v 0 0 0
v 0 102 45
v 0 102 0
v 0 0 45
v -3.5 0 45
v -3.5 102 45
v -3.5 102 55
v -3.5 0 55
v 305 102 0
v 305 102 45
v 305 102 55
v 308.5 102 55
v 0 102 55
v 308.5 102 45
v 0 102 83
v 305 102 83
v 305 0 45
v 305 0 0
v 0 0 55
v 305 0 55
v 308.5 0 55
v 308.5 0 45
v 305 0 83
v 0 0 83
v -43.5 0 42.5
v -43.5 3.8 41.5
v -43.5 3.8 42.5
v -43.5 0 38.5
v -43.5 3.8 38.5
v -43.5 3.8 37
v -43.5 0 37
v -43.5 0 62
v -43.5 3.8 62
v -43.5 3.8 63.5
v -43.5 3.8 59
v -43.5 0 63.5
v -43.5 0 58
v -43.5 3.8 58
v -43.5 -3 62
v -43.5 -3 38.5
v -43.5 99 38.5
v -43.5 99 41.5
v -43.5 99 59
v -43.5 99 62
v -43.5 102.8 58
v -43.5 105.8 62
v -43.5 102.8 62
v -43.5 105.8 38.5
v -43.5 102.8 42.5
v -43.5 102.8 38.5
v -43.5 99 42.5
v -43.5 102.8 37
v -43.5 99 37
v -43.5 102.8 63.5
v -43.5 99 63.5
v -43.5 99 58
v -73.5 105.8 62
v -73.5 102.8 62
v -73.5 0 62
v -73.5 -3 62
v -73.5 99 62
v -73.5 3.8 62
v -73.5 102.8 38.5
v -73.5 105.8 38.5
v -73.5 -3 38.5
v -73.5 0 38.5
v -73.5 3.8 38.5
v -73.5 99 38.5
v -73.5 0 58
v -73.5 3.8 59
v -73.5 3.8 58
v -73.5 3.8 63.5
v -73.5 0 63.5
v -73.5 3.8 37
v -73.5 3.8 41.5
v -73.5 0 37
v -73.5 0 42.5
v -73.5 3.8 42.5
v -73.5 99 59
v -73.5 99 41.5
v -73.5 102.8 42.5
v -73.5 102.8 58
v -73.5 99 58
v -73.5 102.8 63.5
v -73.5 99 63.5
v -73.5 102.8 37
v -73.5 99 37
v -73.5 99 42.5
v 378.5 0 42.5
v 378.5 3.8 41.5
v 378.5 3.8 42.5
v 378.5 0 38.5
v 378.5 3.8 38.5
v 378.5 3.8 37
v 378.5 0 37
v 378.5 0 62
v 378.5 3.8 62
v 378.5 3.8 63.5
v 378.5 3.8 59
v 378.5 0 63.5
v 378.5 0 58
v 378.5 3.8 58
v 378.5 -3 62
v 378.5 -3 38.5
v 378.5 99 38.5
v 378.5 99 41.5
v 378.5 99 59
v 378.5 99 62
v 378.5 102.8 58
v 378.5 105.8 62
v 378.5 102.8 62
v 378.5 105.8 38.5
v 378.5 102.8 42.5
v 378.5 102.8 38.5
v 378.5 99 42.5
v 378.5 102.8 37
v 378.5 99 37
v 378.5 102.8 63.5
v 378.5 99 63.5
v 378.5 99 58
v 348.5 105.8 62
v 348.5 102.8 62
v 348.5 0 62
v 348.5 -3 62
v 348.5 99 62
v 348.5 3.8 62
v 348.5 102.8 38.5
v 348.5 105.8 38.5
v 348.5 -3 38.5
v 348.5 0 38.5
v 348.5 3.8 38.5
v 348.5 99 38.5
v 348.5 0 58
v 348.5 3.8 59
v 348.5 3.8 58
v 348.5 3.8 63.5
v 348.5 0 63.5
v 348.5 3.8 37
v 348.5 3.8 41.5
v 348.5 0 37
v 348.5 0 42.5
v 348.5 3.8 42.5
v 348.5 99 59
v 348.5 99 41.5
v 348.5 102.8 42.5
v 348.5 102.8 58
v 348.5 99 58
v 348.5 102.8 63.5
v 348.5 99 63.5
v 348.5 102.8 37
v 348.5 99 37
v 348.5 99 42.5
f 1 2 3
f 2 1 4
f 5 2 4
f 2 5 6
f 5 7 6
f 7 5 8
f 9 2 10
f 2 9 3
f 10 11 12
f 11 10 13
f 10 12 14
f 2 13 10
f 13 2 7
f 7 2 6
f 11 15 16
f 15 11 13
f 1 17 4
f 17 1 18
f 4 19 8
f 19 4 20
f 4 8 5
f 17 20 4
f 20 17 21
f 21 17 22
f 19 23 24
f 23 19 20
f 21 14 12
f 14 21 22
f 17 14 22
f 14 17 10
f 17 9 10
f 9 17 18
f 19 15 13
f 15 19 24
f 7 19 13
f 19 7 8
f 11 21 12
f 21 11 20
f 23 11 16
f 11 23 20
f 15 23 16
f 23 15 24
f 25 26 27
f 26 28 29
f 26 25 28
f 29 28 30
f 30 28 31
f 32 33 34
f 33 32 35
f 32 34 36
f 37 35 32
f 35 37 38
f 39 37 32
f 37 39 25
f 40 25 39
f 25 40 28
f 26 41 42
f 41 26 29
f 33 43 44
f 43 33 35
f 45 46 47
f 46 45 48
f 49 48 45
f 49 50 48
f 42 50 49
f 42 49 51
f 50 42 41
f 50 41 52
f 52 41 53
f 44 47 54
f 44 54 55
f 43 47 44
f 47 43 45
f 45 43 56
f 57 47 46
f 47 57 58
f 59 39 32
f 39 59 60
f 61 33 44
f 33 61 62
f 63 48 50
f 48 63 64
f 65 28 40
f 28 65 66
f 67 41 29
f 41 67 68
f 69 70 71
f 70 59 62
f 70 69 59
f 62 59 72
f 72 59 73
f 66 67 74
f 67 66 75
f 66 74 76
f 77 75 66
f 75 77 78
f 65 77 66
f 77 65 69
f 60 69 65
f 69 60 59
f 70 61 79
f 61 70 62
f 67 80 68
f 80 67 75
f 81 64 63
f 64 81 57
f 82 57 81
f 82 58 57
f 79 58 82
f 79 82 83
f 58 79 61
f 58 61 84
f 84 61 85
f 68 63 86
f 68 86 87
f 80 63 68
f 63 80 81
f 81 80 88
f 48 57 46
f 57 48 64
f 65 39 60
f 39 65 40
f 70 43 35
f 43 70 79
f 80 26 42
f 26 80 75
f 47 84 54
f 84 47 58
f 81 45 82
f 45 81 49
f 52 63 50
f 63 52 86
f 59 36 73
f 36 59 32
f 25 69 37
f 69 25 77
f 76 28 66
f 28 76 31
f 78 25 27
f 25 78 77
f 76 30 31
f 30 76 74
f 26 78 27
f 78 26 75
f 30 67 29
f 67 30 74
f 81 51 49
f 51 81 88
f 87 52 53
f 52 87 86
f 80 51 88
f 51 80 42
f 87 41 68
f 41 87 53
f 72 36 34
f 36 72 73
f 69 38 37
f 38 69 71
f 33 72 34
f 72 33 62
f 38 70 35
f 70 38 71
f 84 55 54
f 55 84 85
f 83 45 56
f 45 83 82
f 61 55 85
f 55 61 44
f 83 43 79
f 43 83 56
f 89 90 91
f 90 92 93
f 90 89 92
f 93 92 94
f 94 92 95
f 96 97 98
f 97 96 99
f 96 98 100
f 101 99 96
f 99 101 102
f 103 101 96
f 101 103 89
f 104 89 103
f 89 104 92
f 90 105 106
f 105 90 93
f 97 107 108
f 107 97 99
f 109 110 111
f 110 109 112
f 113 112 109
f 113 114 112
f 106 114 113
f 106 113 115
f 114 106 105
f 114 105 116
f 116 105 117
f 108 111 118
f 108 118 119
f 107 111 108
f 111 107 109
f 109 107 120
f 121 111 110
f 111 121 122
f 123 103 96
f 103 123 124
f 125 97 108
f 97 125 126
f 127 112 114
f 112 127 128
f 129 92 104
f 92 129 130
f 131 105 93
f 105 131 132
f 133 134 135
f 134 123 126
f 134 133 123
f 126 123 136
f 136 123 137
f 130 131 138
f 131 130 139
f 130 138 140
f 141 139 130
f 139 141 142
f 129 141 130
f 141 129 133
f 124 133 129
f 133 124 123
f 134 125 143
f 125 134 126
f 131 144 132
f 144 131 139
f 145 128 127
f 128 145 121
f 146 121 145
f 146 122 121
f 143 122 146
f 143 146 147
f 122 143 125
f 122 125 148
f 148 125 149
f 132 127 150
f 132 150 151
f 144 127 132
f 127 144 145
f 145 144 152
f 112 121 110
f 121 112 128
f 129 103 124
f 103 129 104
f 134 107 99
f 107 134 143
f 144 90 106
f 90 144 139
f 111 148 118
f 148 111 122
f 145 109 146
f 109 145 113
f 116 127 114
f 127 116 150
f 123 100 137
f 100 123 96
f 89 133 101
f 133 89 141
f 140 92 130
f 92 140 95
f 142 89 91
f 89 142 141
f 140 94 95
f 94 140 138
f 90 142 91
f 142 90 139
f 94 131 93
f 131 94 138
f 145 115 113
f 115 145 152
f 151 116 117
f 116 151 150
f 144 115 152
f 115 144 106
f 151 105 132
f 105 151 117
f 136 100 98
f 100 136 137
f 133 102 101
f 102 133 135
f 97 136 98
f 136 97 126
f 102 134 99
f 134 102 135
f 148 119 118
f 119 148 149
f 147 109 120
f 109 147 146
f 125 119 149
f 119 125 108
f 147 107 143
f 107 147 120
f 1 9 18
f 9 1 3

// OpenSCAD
// 05_external_spring_clip.scad
// Separate C-shaped external bracket (print in PETG or PA12 for flex)
// that snaps over each SHORT END of the stacked trays.
// Inward lips hook under a lower-tray rim ledge and over an upper-tray rim ledge.
// Two clips, one per short end.
// Engage: press clip sideways over the end of the stack — lips snap onto rims.
// Release: squeeze clip sides outward and slide off.
//
// explode=0  → clips engaged on stack
// explode=40 → clips pulled away from stack ends (exploded)

explode = 40;

lx=305; ly=102; lz=50;
ux=305; uy=102; uz=33;

stack_h  = lz + uz;    // total stack height = 83

// Rim ledge geometry (moulded into tray short-end outer face)
rim_thick = 3.5;   // rim protrudes this much in X from tray end face
rim_h     = 5;     // rim height (tall enough to be grabbed by lip)
// Lower rim at top of lower tray; upper rim at bottom of upper tray
lower_rim_z = lz - rim_h;     // rim bottom Z on lower tray
upper_rim_z = lz;             // rim bottom Z on upper tray (at the joint)

// Clip dimensions
clip_len  = 30;       // clip depth in X (how much it grips end face)
clip_t    = 3.0;      // clip wall thickness
clip_span = ly + 0.8; // internal Y span (just over tray Y)
clip_ow   = clip_span + clip_t*2; // clip outer Y width
// The clip must span from rim_h below lower_rim_z to rim_h above upper_rim_z+rim_h
clip_inner_h = rim_h + (lz - lower_rim_z) + (rim_h) + rim_h; // spans both rims + gap
clip_inner_h2 = uz + rim_h*2 + 2; // simpler: upper tray height + both lips + gap

lip_d    = 3.8;   // inward lip depth (hooks under/over rim)
lip_h    = rim_h + 0.5; // lip height matches rim

module lower_tray() { color("SteelBlue",0.85)    cube([lx,ly,lz]); }
module upper_tray() { color("LightSkyBlue",0.85) cube([ux,uy,uz]); }

// Rim ledge on a short-end face (protrudes outward in -X or +X)
module rim(z_pos, side) {
    // side 0 = X=0 face (ledge goes in -X), side 1 = X=lx face (+X)
    dir = (side==0) ? -1 : 1;
    color("DimGray",0.78)
    translate([(side==0) ? -rim_thick : lx, 0, z_pos])
        cube([rim_thick, ly, rim_h]);
}

// The C-clip: cross-section is C in YZ, extruded along X (clip_len deep)
// It has an inward lip at the bottom (grabs lower rim) and top (grabs upper rim)
module c_clip(side) {
    // Positioned at the tray end, offset by explode
    x_off = (side==0)
        ? -(clip_len + rim_thick + (explode>0 ? explode : 0))
        : lx + rim_thick + (explode>0 ? explode : 0);

    // Z so clip straddles both rims
    clip_z = lower_rim_z - lip_h - 1;
    inner_h = (upper_rim_z + rim_h + 1) - (lower_rim_z - 1) + lip_h;

    color("Orange",0.93)
    translate([x_off, -clip_t, clip_z])
    difference() {
        // Outer block
        cube([clip_len, clip_ow, inner_h + clip_t*2]);
        // Core cavity (tray end fits here)
        translate([0, clip_t, clip_t])
            cube([clip_len, clip_span, inner_h]);
        // Open the X face (the side facing the tray) — remove front wall
        translate([-0.1, clip_t, clip_t])
            cube([clip_t + 0.2, clip_span, inner_h]);
    }

    // Bottom inward lip (points inward in +Y from both sides, grabs lower rim)
    color("OrangeRed",0.92)
    translate([x_off, -clip_t, clip_z])
    union() {
        // back lip
        translate([0, clip_t, clip_t - lip_h + 1])
            cube([clip_len, lip_d, lip_h]);
        // front lip
        translate([0, clip_t + clip_span - lip_d, clip_t - lip_h + 1])
            cube([clip_len, lip_d, lip_h]);
    }

    // Top inward lip (grabs upper rim)
    color("OrangeRed",0.92)
    translate([x_off, -clip_t, clip_z])
    union() {
        translate([0, clip_t, clip_t + inner_h - 1])
            cube([clip_len, lip_d, lip_h]);
        translate([0, clip_t + clip_span - lip_d, clip_t + inner_h - 1])
            cube([clip_len, lip_d, lip_h]);
    }
}

// ==== Lower tray with rims ====
lower_tray();
for(s=[0,1]) rim(lower_rim_z, s);

// ==== Upper tray with rims ====
translate([0,0,lz])
{
    upper_tray();
    for(s=[0,1]) rim(0, s);  // rim at Z=0 of upper tray (the bottom face = lz in world)
}

// ==== Two C-clips, one per short end ====
for(s=[0,1])
    c_clip(s);
